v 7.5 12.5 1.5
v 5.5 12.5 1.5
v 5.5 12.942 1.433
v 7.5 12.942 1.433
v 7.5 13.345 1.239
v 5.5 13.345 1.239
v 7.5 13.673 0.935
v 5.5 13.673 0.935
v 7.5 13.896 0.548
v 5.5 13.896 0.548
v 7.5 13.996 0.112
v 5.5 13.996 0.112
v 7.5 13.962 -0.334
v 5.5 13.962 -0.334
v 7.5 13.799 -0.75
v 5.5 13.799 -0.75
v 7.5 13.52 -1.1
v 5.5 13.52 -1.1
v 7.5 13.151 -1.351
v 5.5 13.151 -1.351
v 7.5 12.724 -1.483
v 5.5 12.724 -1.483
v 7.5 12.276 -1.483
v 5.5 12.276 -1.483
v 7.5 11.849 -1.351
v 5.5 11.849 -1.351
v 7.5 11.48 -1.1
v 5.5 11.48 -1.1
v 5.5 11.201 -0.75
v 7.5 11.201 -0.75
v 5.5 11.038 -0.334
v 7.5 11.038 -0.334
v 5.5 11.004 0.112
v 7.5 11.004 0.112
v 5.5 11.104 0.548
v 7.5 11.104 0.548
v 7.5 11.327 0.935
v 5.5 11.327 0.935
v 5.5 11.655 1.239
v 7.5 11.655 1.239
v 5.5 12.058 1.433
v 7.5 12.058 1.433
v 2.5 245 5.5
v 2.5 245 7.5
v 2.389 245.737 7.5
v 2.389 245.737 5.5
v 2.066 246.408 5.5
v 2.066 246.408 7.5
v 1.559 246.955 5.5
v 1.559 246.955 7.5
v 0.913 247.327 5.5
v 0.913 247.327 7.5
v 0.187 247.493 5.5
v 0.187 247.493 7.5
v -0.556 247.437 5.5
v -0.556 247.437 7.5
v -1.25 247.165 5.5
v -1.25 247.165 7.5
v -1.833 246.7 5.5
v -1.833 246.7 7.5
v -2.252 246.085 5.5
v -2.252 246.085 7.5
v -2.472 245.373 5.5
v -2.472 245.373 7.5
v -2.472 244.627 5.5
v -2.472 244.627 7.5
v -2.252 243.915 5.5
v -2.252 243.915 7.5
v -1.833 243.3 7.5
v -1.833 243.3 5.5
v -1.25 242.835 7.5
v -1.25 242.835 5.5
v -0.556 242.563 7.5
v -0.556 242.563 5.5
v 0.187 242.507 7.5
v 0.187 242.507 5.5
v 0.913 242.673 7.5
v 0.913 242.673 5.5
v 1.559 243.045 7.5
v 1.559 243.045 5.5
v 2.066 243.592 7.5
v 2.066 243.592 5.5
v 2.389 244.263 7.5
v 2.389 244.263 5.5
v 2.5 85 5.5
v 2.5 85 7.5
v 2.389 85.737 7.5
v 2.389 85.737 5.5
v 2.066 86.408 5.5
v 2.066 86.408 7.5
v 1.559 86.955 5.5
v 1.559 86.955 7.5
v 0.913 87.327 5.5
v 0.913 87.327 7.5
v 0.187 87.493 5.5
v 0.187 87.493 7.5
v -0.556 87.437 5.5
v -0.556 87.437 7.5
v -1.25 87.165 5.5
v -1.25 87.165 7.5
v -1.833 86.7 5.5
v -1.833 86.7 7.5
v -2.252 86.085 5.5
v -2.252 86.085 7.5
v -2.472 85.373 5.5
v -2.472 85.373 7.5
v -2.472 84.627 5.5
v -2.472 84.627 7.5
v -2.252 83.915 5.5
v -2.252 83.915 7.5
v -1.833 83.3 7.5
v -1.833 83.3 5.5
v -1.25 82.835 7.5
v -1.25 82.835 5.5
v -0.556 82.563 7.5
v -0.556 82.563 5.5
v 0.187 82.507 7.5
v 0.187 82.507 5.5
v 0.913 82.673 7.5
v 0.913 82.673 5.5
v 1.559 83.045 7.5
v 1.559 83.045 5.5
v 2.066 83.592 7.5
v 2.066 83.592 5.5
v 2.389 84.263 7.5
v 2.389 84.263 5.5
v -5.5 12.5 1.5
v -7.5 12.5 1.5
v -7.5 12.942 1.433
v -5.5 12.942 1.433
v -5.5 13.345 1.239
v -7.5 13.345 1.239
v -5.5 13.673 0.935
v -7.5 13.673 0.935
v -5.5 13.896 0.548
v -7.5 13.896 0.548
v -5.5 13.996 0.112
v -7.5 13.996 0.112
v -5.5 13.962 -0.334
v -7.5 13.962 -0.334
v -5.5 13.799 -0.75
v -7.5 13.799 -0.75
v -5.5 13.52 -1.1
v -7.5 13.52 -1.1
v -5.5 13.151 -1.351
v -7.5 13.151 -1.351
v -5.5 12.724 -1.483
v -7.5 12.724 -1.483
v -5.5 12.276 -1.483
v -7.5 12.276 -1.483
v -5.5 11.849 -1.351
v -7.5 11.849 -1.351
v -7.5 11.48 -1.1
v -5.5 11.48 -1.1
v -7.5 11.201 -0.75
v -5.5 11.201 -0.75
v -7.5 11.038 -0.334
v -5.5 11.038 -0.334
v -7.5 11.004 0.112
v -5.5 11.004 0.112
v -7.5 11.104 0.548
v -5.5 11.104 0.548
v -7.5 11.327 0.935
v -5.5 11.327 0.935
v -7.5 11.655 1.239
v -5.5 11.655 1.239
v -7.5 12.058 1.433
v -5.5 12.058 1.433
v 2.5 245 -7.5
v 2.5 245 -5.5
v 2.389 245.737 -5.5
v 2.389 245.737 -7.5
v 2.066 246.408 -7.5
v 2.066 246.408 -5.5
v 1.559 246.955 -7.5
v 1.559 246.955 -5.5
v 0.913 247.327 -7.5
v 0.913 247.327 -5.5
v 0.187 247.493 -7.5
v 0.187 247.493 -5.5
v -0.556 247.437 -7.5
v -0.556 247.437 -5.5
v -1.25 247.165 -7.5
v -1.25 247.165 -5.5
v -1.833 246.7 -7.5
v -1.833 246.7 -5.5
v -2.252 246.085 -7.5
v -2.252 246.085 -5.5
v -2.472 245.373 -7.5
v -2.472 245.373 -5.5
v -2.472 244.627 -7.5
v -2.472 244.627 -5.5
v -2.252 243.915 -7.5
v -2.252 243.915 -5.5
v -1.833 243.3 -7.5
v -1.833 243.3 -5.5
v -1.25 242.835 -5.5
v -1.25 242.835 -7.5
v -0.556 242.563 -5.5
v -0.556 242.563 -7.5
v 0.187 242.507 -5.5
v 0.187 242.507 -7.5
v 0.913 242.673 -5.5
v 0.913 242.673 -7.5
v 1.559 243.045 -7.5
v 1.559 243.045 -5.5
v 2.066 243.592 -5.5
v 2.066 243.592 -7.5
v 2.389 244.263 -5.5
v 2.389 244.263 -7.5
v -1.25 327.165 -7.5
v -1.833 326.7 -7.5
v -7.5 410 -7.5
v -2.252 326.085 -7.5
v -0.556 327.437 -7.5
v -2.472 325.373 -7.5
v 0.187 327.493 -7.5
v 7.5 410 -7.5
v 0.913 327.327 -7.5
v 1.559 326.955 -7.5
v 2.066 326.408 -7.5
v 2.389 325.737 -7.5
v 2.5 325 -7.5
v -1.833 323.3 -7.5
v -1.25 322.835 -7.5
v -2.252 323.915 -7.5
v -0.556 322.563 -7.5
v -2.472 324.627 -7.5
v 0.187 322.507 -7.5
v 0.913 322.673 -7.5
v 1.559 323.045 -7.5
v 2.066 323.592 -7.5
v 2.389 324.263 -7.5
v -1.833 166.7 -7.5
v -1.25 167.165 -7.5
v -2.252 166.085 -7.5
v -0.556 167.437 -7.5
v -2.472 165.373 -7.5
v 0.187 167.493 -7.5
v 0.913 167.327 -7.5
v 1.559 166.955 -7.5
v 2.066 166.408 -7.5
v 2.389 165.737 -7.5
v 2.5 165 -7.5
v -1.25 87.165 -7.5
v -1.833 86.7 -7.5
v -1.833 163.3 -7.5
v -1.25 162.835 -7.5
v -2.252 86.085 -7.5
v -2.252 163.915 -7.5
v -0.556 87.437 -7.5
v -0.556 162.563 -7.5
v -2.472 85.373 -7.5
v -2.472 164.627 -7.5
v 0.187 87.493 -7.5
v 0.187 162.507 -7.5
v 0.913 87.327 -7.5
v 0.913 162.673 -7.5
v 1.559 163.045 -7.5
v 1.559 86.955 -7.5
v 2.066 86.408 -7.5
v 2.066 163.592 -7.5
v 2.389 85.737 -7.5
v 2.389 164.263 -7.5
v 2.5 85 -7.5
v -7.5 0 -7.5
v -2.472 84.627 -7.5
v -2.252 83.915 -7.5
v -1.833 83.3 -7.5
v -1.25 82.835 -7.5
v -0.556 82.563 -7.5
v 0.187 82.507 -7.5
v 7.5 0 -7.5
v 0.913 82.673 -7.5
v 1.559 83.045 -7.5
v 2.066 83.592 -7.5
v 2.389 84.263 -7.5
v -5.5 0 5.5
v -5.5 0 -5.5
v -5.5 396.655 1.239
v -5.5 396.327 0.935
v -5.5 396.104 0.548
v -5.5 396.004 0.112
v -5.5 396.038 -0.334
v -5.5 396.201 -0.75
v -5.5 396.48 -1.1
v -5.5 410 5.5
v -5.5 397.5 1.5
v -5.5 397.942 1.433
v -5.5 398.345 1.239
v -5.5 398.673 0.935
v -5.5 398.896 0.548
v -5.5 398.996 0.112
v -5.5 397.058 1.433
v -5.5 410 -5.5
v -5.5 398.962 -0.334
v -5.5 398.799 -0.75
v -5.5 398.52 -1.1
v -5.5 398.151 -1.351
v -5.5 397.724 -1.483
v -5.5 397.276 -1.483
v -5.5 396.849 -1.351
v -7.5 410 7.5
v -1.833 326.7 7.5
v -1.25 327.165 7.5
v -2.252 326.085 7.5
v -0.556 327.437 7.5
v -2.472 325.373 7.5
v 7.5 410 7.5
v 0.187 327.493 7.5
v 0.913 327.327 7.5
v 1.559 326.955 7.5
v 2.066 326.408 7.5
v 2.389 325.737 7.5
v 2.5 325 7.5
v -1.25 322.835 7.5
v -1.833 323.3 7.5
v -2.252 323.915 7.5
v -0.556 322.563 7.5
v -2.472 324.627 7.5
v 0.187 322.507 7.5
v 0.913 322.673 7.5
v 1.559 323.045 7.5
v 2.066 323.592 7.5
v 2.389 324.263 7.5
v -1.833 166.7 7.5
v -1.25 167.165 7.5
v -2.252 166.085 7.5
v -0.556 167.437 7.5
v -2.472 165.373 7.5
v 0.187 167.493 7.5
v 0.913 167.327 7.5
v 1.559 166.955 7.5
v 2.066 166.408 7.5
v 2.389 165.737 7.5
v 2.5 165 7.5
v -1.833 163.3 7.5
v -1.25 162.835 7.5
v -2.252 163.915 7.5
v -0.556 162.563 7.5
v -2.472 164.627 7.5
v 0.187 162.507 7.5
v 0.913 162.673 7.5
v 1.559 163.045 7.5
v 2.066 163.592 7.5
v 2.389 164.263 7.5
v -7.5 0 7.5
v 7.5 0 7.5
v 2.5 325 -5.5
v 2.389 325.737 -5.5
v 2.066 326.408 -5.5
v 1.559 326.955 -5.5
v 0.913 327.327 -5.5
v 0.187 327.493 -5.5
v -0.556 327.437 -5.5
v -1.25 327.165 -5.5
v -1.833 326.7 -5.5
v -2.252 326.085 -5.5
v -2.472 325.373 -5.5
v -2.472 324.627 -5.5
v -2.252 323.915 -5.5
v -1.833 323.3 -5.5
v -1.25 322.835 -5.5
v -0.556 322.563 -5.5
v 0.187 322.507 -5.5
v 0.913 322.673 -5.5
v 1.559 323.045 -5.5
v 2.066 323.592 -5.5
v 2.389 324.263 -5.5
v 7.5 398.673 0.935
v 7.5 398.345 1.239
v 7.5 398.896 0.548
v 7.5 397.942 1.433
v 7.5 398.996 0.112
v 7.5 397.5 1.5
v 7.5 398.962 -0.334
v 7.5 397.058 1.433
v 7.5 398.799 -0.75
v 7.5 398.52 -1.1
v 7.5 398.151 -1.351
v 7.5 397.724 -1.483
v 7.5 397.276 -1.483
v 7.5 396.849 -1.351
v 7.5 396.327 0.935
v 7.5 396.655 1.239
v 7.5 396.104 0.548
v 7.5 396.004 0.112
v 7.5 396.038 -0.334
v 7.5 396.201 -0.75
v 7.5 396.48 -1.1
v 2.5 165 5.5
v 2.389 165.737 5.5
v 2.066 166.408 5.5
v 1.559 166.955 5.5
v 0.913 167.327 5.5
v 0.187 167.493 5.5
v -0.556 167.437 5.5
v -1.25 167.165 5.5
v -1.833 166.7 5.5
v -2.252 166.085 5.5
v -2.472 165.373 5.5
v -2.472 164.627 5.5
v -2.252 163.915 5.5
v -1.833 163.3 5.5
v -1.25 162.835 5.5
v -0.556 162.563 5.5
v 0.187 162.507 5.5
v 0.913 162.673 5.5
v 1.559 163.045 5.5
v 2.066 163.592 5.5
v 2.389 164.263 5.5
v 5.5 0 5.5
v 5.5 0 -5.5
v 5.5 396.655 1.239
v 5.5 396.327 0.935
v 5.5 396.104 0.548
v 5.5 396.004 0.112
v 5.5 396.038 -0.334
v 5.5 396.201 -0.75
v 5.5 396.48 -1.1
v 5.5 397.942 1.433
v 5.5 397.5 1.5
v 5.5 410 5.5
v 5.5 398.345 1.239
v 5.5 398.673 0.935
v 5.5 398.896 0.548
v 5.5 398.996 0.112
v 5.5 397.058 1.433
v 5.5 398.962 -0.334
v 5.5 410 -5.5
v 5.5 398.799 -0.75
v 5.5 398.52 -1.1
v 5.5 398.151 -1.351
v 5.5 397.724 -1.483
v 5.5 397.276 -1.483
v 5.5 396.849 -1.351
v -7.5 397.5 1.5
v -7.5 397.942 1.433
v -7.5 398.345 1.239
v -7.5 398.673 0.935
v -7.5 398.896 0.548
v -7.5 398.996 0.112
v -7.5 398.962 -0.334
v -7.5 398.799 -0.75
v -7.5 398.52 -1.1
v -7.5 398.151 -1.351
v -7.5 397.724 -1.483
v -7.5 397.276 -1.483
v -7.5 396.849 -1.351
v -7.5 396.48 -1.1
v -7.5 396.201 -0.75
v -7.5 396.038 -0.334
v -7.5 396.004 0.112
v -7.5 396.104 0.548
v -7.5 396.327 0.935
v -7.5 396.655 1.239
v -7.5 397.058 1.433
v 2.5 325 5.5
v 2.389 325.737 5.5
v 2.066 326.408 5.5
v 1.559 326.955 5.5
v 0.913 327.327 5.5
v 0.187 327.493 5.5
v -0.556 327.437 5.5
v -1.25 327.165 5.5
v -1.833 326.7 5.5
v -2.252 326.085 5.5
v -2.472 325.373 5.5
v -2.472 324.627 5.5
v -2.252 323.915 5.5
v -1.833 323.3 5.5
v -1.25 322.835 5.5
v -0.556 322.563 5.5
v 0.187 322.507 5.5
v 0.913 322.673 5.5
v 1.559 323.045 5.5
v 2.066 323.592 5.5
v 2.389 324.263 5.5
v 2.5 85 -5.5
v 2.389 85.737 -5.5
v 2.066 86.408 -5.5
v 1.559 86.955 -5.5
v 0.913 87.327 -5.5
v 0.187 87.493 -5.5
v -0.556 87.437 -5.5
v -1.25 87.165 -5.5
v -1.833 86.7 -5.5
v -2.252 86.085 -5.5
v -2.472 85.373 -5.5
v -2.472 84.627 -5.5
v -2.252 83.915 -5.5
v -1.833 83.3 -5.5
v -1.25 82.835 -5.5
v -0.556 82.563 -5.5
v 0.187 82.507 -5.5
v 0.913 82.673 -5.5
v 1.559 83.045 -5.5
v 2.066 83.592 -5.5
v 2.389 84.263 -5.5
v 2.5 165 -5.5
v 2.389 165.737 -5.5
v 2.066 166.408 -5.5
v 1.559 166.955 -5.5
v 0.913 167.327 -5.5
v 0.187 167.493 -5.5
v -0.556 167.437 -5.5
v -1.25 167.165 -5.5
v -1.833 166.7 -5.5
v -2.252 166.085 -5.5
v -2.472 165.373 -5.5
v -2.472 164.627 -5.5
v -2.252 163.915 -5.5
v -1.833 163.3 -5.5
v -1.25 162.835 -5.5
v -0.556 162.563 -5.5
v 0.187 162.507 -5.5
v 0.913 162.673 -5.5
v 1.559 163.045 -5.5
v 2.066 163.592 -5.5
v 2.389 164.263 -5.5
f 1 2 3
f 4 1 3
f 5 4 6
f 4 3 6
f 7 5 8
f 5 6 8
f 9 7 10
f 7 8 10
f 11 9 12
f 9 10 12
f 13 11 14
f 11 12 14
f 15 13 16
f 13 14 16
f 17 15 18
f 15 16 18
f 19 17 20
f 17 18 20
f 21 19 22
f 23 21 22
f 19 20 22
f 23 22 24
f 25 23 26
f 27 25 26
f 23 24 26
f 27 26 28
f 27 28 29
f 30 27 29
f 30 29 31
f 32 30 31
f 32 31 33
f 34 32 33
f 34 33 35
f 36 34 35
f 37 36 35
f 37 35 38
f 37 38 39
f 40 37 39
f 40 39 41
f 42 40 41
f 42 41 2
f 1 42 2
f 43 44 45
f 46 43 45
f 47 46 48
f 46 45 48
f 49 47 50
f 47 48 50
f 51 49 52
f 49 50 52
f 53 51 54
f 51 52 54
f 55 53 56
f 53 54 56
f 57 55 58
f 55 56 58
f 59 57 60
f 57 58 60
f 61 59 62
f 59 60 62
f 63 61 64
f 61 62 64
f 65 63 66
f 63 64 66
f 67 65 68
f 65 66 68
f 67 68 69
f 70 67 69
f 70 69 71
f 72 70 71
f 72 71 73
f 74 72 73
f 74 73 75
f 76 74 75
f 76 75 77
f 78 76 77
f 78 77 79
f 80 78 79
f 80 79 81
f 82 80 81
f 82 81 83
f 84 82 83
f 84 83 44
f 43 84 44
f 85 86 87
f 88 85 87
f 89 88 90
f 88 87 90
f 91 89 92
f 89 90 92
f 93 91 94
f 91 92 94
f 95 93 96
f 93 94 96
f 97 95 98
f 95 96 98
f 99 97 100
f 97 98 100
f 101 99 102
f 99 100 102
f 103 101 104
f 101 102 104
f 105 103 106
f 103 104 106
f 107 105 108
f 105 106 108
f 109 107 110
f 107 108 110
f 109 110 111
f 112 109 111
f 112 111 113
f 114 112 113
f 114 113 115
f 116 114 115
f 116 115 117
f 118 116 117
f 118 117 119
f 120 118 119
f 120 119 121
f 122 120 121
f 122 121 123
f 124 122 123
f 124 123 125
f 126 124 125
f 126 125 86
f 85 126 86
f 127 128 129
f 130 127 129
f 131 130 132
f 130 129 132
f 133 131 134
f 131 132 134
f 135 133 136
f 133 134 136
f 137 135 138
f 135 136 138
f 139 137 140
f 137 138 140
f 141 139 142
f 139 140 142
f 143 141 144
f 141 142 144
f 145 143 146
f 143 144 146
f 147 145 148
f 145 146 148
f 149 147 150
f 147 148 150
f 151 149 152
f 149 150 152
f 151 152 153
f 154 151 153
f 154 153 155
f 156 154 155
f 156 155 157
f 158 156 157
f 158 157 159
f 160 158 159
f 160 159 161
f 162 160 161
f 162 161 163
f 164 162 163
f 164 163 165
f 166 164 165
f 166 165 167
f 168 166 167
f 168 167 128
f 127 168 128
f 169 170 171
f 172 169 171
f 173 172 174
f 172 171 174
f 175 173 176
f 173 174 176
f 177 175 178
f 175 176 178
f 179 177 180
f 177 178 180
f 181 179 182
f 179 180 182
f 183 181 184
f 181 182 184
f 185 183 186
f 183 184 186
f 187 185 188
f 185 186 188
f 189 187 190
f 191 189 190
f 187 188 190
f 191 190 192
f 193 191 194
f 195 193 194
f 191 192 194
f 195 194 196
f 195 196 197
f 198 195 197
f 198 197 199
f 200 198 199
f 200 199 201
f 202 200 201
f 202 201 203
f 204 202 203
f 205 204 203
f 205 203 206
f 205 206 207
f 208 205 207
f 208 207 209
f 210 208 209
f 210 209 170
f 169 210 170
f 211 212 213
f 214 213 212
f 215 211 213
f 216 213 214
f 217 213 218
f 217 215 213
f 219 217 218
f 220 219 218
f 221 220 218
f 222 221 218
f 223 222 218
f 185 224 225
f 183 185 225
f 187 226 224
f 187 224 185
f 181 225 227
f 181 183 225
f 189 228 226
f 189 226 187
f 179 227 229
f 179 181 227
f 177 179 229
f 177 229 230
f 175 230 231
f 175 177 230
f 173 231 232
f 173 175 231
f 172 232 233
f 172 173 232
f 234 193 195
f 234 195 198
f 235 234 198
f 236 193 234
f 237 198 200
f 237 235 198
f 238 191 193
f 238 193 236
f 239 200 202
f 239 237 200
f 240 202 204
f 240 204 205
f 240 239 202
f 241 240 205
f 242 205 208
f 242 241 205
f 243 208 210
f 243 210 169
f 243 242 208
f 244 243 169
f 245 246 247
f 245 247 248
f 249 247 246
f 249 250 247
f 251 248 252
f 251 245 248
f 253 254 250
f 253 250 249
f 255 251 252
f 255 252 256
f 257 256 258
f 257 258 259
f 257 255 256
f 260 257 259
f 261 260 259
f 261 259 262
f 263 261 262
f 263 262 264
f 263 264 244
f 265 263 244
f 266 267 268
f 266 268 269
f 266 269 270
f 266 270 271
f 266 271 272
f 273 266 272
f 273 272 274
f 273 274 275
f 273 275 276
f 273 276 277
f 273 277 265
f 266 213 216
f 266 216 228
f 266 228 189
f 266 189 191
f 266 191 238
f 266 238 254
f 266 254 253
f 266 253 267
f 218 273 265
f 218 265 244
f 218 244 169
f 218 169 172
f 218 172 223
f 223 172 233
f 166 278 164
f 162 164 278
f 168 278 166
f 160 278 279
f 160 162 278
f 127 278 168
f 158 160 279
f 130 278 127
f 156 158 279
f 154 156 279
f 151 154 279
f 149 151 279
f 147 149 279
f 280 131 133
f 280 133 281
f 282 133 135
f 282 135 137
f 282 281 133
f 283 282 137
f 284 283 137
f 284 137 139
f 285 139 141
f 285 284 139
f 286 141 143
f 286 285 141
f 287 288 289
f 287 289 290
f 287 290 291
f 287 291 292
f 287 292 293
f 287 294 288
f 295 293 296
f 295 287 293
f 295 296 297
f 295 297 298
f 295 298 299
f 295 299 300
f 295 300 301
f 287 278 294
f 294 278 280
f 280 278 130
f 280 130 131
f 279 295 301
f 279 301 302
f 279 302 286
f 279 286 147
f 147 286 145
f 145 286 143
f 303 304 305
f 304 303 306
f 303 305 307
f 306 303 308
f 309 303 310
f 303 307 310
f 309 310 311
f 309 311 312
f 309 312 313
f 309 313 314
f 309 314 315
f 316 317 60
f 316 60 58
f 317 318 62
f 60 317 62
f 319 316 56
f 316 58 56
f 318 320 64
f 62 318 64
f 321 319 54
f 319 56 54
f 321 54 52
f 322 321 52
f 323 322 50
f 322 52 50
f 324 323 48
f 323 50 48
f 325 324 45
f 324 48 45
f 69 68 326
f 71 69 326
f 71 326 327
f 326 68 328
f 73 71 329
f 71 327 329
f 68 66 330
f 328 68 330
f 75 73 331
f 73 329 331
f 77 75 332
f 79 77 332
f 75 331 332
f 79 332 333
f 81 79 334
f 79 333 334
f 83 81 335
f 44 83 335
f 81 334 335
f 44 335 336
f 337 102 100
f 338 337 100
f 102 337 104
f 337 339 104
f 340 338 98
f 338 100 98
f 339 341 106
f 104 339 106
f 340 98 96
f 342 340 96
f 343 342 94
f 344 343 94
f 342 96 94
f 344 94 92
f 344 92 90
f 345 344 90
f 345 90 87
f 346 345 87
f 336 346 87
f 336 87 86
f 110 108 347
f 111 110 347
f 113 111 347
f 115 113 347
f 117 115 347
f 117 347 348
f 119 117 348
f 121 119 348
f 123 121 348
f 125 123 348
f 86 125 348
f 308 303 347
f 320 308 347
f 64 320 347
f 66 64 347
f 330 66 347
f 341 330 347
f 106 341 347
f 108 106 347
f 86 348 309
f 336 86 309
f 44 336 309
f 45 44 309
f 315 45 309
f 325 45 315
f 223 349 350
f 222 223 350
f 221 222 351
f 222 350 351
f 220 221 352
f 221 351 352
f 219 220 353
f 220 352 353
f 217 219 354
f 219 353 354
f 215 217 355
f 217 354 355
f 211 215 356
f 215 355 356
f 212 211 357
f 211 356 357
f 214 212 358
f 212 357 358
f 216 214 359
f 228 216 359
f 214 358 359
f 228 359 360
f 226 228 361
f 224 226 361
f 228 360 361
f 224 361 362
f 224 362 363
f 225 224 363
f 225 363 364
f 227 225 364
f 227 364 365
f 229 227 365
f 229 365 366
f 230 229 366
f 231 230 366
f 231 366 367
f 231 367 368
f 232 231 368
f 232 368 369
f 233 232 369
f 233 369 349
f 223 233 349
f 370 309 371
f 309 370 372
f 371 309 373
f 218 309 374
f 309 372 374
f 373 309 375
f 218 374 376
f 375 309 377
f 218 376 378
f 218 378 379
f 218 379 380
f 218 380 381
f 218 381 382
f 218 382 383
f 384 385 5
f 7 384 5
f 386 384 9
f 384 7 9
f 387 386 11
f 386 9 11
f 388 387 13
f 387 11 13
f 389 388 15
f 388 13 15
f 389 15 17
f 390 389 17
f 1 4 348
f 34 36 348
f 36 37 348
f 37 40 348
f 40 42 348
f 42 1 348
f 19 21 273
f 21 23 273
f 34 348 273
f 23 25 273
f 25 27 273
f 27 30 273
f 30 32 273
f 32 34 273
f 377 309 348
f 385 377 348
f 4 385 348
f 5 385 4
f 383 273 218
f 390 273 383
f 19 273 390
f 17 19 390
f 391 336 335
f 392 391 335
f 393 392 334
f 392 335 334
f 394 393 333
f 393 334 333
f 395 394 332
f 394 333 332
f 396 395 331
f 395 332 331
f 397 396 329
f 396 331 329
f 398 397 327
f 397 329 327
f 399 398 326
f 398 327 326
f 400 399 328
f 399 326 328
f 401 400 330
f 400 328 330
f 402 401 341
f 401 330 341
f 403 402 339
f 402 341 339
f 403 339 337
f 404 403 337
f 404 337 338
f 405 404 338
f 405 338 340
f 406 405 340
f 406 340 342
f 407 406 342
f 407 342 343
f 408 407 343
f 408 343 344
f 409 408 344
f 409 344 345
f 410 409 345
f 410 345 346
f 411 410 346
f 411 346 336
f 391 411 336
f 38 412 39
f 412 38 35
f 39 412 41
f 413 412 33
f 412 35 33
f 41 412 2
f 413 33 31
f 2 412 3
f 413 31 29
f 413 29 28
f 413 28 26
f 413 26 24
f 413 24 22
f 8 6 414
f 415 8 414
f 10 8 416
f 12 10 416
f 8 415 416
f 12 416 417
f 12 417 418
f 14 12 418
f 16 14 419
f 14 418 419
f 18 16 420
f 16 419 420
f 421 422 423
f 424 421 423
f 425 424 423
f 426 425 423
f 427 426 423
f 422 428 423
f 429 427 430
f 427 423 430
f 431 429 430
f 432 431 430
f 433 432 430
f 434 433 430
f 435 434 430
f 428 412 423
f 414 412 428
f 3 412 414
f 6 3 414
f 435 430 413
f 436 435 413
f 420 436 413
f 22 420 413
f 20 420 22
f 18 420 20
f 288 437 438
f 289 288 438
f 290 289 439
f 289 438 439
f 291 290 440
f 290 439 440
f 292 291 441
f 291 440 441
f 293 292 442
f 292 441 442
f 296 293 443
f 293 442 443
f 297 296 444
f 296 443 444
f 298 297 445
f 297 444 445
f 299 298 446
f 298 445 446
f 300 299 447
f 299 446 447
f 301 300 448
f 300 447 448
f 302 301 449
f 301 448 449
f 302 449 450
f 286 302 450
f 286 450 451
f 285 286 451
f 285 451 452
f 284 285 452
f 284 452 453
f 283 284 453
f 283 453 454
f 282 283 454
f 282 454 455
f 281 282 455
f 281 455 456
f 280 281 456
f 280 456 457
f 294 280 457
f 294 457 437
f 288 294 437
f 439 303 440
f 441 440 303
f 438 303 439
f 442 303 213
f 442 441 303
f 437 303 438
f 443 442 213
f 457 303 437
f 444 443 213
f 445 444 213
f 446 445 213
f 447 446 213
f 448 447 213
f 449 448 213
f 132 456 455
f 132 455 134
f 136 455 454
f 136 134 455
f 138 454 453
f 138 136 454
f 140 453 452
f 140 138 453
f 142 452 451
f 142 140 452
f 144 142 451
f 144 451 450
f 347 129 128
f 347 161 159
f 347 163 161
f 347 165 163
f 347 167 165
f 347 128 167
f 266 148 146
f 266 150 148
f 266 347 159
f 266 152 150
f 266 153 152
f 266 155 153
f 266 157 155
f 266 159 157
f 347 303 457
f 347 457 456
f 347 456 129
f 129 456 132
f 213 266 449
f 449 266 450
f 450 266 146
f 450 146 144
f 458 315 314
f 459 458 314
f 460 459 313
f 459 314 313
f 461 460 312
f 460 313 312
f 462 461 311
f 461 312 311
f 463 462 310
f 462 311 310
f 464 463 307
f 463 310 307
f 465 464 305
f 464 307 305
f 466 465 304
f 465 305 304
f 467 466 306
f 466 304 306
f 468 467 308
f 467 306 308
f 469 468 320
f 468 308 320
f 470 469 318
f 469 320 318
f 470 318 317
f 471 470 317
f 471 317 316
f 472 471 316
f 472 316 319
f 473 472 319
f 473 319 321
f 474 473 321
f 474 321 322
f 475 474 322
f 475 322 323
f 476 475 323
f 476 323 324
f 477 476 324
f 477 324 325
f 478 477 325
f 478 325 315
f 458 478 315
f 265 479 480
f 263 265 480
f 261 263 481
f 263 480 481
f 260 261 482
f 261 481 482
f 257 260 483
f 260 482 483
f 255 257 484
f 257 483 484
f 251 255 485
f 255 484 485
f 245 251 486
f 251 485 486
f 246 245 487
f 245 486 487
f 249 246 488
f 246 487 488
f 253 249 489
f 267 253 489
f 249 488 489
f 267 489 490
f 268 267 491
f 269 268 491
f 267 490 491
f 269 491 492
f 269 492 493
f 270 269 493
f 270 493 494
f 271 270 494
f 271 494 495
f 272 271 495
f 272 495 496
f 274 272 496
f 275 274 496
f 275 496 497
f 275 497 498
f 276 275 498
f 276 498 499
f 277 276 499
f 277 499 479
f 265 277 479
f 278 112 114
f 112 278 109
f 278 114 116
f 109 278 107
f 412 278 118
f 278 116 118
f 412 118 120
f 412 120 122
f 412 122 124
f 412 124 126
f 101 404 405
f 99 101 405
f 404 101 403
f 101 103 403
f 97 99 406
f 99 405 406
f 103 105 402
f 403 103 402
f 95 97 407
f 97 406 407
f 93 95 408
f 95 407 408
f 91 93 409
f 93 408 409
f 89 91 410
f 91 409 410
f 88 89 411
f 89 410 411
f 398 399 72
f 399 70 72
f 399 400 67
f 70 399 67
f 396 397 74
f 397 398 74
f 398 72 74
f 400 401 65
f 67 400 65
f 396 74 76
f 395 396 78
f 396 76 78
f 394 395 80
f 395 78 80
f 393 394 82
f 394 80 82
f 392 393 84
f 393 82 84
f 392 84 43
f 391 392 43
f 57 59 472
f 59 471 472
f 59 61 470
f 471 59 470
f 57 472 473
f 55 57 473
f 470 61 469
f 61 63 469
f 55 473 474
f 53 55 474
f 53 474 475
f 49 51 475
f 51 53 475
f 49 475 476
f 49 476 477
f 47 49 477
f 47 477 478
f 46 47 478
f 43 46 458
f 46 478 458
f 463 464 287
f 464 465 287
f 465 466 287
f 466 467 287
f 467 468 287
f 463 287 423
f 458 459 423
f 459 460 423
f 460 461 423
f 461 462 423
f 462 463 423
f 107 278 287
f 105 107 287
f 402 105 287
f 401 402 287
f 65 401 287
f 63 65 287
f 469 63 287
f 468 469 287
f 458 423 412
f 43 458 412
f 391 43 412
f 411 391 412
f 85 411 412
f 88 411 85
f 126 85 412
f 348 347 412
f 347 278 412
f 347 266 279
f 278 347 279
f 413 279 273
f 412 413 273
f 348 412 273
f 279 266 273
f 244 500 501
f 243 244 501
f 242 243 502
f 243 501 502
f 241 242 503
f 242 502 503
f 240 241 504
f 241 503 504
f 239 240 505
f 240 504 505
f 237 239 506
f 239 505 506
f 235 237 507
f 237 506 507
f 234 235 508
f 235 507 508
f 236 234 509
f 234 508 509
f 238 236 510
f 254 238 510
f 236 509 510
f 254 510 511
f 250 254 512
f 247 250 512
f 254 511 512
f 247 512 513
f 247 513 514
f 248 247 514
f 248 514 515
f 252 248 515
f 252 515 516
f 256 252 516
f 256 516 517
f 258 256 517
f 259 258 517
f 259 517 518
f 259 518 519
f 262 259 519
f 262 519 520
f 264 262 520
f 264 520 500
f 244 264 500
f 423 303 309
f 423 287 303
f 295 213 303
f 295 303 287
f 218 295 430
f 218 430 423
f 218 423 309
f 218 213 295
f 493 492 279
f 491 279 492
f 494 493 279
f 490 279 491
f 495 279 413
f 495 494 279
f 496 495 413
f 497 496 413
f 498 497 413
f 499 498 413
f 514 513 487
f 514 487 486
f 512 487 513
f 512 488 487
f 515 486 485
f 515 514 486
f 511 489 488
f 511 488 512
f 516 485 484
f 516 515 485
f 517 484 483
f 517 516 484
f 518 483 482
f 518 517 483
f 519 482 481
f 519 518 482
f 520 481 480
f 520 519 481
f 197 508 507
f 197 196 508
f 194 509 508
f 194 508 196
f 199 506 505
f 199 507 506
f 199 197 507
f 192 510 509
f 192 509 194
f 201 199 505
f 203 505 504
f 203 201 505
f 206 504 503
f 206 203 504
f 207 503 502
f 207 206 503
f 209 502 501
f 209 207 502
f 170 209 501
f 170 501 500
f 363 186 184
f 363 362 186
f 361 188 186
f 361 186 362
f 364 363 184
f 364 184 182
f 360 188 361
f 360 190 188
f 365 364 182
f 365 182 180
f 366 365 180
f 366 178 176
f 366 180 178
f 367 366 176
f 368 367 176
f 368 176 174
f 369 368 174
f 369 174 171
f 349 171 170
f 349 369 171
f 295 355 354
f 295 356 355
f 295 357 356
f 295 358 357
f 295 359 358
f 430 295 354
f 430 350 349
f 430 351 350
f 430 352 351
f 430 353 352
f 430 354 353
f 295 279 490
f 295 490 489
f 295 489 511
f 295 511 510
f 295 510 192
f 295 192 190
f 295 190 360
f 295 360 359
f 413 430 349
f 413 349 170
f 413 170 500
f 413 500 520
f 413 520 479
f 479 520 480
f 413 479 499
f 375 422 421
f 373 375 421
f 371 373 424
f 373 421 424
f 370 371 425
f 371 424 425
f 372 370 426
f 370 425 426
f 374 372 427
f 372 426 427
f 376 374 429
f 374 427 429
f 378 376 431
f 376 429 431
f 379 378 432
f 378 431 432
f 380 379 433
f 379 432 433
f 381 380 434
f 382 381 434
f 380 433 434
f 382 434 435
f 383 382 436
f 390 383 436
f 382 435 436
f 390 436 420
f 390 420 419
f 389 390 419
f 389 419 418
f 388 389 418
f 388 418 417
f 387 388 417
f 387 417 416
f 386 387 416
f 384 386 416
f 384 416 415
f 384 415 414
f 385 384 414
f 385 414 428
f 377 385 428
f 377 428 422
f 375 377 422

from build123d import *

# Parameters (mm, degrees)
SKETCH_1_W          = 15
SKETCH_1_H          = 15
EXTRUDE_1_DEPTH     = 410
SKETCH_2_W          = 11
SKETCH_2_H          = 11
CUT_EXTRUDE_1_DEPTH = 410
SKETCH_3_R          = 2.5
CUT_EXTRUDE_2_DEPTH = 15
SKETCH_4_R          = 1.5
CUT_EXTRUDE_3_DEPTH = 15


with BuildPart() as part:
    # 草图1 → 凸台-拉伸1 (new body)
    with BuildSketch(Plane(origin=(0, 0, 0), x_dir=(1, 0, 0), z_dir=(0, 1, 0))):
        Rectangle(SKETCH_1_W, SKETCH_1_H)
    extrude(amount=EXTRUDE_1_DEPTH)

    # 草图2 → 切除-拉伸1 (cut)
    with BuildSketch(Plane(origin=(0, 410, 0), x_dir=(1, 0, 0), z_dir=(0, 1, 0))):
        Rectangle(SKETCH_2_W, SKETCH_2_H)
    extrude(amount=-CUT_EXTRUDE_1_DEPTH, mode=Mode.SUBTRACT)

    # 草图3 → 切除-拉伸2 (cut)
    with BuildSketch(Plane.XY.offset(7.5)):
        with Locations((0, 85)):
            Circle(SKETCH_3_R)
        with Locations((0, 165)):
            Circle(SKETCH_3_R)
        with Locations((0, 245)):
            Circle(SKETCH_3_R)
        with Locations((0, 325)):
            Circle(SKETCH_3_R)
    extrude(amount=-CUT_EXTRUDE_2_DEPTH, mode=Mode.SUBTRACT)

    # 草图4 → 切除-拉伸3 (cut)
    with BuildSketch(Plane.ZY.offset(7.5)):
        with Locations((0, 12.5)):
            Circle(SKETCH_4_R)
        with Locations((0, 397.5)):
            Circle(SKETCH_4_R)
    extrude(amount=-CUT_EXTRUDE_3_DEPTH, mode=Mode.SUBTRACT)


solid = part.part
